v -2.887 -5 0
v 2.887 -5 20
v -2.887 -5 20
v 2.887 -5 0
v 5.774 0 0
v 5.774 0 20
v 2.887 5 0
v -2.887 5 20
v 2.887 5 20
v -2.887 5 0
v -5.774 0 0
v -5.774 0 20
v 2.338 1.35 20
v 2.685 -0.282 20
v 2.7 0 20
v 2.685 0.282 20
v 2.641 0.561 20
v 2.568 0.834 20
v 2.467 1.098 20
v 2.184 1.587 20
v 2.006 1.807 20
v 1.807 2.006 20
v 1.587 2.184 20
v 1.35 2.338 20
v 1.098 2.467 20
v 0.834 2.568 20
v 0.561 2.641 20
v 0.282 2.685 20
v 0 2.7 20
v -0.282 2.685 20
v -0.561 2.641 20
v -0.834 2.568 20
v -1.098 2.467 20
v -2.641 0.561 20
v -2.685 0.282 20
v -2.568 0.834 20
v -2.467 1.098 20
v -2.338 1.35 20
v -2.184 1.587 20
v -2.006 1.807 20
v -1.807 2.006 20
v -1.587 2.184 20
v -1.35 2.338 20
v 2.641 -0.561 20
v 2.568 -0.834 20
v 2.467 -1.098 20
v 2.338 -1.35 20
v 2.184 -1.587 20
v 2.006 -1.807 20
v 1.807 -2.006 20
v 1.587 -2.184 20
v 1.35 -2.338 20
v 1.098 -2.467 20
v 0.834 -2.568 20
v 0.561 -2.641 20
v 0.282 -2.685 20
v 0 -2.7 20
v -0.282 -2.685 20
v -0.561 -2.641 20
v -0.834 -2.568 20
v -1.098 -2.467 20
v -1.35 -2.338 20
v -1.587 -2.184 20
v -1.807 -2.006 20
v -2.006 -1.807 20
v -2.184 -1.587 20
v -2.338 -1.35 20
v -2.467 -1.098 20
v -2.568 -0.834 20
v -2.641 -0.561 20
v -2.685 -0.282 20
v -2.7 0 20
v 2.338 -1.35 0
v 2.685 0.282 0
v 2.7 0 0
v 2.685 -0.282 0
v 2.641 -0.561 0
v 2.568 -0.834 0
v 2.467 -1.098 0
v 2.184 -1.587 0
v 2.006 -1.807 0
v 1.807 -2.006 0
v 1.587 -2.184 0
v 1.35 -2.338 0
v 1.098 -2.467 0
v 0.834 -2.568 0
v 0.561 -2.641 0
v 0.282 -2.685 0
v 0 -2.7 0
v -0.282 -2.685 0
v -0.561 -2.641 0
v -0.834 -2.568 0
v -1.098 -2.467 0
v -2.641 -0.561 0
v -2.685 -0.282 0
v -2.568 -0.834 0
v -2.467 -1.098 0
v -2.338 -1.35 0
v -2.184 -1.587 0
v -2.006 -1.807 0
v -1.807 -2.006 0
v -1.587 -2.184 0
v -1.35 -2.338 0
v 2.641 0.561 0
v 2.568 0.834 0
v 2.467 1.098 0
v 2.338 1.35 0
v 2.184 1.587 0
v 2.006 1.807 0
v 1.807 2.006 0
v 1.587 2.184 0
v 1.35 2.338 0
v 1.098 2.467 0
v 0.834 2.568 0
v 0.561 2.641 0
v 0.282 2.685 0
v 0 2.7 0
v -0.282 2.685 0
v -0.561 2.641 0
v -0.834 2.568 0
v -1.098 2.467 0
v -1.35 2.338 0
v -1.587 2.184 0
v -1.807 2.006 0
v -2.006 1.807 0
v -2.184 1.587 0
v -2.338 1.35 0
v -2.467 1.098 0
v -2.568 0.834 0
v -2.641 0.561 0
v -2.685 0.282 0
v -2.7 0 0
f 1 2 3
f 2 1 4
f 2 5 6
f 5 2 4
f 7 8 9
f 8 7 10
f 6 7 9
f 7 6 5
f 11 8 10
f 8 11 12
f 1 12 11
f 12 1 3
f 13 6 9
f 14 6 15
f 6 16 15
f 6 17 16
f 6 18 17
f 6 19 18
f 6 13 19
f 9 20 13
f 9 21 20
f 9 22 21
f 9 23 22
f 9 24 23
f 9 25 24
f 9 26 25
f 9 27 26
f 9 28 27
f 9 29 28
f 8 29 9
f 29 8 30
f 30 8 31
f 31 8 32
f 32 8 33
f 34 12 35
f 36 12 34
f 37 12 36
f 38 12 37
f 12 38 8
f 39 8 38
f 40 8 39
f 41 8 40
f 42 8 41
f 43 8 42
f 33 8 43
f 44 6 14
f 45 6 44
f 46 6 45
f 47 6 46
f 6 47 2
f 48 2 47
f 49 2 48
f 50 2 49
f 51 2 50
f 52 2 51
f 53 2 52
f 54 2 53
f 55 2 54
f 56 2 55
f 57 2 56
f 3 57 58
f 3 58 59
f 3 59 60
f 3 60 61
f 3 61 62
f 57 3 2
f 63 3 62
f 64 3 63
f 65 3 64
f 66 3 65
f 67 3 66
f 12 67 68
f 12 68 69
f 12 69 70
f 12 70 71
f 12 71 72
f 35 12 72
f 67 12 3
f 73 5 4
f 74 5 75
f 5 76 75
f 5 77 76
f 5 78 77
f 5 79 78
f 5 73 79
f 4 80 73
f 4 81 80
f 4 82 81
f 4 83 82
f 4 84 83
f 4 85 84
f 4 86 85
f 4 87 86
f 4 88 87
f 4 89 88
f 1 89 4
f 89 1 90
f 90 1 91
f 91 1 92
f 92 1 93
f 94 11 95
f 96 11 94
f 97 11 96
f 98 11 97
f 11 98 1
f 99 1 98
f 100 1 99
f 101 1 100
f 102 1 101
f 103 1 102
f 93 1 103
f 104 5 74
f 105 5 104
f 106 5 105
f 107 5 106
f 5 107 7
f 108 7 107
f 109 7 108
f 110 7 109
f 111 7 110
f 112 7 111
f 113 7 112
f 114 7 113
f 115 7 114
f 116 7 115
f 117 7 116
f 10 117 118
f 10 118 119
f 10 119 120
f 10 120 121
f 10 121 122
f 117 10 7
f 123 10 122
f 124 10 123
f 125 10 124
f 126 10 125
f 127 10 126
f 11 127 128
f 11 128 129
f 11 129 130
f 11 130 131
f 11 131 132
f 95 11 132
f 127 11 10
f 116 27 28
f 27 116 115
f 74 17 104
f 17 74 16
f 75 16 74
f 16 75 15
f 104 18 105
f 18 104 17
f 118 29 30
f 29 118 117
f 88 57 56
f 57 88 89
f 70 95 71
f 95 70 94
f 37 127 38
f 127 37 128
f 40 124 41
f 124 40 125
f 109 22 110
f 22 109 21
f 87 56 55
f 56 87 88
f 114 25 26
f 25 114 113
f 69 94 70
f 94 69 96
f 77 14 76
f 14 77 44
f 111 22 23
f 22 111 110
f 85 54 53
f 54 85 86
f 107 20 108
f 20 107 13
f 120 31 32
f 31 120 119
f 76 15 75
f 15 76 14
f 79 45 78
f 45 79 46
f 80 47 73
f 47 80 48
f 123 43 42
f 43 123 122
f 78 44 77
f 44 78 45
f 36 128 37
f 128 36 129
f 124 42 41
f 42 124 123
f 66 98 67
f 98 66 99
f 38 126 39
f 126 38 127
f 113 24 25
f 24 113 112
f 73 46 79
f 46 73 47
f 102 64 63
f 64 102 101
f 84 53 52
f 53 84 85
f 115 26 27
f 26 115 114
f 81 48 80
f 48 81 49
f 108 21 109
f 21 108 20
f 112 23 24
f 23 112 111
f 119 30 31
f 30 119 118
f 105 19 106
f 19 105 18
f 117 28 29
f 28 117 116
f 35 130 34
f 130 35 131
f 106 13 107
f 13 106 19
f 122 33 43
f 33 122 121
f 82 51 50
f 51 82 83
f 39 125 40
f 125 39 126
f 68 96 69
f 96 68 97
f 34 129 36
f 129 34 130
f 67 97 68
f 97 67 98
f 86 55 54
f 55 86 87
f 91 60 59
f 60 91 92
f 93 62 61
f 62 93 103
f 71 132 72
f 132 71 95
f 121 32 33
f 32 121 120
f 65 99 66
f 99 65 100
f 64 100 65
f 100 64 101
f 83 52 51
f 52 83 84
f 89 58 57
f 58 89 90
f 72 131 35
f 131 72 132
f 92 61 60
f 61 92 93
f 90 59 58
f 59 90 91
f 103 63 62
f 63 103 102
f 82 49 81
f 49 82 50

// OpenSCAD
// Hex standoff, 20 mm long.
$fn = 60;
eps = 0.02;
thread_d = 5.4;
flat = 10;
length = 20;
chamfer = 1.2;
difference() {
    union() {
        cylinder(d = flat / cos(30), h = length, $fn = 6);
        cylinder(d1 = flat / cos(30) - 2 * chamfer, d2 = flat / cos(30), h = chamfer, $fn = 6);
        translate([0, 0, length - chamfer]) cylinder(d1 = flat / cos(30), d2 = flat / cos(30) - 2 * chamfer, h = chamfer, $fn = 6);
    }
    translate([0, 0, -eps]) cylinder(d = thread_d, h = length + 2 * eps);
}
